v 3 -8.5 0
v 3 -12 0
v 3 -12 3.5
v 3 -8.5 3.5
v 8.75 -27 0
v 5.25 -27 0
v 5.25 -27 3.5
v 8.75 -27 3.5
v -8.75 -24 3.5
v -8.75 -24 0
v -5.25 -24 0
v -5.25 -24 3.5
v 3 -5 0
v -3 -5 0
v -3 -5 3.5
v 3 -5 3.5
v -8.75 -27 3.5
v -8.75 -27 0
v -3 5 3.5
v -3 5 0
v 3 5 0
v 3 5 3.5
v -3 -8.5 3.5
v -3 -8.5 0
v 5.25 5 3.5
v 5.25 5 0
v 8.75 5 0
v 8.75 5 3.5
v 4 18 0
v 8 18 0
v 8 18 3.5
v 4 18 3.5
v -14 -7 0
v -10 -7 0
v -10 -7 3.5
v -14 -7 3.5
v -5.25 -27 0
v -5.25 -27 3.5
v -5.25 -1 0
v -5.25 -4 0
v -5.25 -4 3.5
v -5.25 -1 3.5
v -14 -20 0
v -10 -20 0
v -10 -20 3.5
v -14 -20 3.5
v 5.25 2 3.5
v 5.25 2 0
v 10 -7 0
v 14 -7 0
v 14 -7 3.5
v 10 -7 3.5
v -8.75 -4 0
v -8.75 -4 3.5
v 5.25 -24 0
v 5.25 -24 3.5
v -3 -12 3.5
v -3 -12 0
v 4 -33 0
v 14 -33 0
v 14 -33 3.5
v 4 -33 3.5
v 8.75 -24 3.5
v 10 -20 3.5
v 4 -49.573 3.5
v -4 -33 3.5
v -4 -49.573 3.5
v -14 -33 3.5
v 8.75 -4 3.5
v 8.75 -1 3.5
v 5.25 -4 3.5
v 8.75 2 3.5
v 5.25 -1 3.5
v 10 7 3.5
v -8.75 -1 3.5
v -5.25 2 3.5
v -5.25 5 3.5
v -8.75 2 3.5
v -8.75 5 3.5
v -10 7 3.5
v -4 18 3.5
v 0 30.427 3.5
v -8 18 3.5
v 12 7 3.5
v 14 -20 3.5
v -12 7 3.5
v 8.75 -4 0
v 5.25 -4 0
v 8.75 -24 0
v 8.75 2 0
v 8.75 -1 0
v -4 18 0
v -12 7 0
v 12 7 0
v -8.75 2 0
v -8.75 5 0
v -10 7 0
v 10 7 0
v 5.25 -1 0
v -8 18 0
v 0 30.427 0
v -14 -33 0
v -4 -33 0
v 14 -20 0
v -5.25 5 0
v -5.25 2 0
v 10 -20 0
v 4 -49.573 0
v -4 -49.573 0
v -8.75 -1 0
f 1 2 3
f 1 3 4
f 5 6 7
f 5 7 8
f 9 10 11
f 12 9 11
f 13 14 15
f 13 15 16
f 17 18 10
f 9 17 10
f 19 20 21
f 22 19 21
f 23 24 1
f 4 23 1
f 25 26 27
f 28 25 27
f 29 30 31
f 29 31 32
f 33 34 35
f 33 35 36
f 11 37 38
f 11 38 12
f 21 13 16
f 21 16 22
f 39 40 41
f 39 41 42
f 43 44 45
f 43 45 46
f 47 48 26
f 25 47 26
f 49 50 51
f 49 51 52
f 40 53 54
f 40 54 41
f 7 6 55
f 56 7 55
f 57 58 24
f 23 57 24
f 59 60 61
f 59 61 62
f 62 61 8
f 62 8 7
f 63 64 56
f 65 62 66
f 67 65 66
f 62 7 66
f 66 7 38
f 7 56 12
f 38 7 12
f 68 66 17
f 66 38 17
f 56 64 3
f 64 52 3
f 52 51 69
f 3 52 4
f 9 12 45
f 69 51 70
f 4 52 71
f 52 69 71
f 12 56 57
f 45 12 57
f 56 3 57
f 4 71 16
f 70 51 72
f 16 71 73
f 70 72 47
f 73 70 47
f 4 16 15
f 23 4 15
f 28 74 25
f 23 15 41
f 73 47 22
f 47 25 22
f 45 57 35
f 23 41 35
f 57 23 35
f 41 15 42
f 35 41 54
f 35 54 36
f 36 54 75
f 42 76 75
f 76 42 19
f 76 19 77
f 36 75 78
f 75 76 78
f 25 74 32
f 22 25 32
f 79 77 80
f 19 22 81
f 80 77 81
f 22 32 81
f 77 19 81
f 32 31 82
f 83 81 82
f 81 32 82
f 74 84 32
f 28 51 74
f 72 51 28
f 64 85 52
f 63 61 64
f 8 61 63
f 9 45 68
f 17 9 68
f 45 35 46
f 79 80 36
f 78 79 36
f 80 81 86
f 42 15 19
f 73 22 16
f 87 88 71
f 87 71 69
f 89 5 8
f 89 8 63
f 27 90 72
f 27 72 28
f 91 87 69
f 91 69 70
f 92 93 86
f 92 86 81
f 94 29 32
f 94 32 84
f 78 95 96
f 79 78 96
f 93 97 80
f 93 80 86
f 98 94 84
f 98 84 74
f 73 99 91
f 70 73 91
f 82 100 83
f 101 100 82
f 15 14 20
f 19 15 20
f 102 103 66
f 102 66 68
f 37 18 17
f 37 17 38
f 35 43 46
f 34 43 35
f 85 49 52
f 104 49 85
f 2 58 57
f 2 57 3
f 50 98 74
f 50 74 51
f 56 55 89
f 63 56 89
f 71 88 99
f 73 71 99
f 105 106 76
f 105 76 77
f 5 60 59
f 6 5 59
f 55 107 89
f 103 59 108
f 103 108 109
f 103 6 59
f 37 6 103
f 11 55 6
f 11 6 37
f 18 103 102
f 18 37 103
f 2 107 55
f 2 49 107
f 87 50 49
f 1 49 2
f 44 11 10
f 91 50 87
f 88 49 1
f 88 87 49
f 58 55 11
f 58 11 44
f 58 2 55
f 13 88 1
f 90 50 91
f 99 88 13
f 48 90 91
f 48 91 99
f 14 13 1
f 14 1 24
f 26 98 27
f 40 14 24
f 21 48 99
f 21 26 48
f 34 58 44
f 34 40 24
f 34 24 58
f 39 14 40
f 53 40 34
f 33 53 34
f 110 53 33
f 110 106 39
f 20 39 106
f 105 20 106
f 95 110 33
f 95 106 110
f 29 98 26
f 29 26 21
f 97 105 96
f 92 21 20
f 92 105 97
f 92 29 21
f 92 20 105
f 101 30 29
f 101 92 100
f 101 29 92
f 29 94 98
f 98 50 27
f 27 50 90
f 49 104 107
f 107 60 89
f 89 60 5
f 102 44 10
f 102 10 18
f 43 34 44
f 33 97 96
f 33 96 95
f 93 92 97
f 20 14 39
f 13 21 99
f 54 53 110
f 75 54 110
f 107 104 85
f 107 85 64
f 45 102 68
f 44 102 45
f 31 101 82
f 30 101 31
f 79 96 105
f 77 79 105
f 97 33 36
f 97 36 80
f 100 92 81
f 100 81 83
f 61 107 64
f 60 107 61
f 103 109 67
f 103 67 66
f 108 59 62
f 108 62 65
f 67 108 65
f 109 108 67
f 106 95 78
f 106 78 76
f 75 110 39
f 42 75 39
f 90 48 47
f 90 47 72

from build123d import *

# Parameters (mm, degrees)
PROFILE_LASER_PROFILE_3P5_W   = 3.5
PROFILE_LASER_PROFILE_3P5_H   = 3
PROFILE_LASER_PROFILE_3P5_W_2 = 6
PROFILE_LASER_PROFILE_3P5_H_2 = 3.5
PROFILE_LASER_PROFILE_3P5_H_3 = 10
LASER_PROFILE_3P5_DEPTH       = 3.5


with BuildPart() as part:
    # Profile_Laser_profile_3p5 → Laser_profile_3p5 (new body)
    with BuildSketch(Plane.XY):
        Polygon((0, 30.427227289), (8, 18), (4, 18), (12, 7), (10, 7), (14, -7), (10, -7), (14, -20), (10, -20), (14, -33), (4, -33), (4, -49.572772711), (-4, -49.572772711), (-4, -33), (-14, -33), (-10, -20), (-14, -20), (-10, -7), (-14, -7), (-10, 7), (-12, 7), (-4, 18), (-8, 18), align=None)
        with Locations((-7, 3.5)):
            Rectangle(PROFILE_LASER_PROFILE_3P5_W, PROFILE_LASER_PROFILE_3P5_H, mode=Mode.SUBTRACT)
        with Locations((-7, -2.5)):
            Rectangle(PROFILE_LASER_PROFILE_3P5_W, PROFILE_LASER_PROFILE_3P5_H, mode=Mode.SUBTRACT)
        with Locations((-7, -25.5)):
            Rectangle(PROFILE_LASER_PROFILE_3P5_W, PROFILE_LASER_PROFILE_3P5_H, mode=Mode.SUBTRACT)
        with Locations((7, 3.5)):
            Rectangle(PROFILE_LASER_PROFILE_3P5_W, PROFILE_LASER_PROFILE_3P5_H, mode=Mode.SUBTRACT)
        with Locations((7, -2.5)):
            Rectangle(PROFILE_LASER_PROFILE_3P5_W, PROFILE_LASER_PROFILE_3P5_H, mode=Mode.SUBTRACT)
        with Locations((7, -25.5)):
            Rectangle(PROFILE_LASER_PROFILE_3P5_W, PROFILE_LASER_PROFILE_3P5_H, mode=Mode.SUBTRACT)
        with Locations((0, -10.25)):
            Rectangle(PROFILE_LASER_PROFILE_3P5_W_2, PROFILE_LASER_PROFILE_3P5_H_2, mode=Mode.SUBTRACT)
        Rectangle(PROFILE_LASER_PROFILE_3P5_W_2, PROFILE_LASER_PROFILE_3P5_H_3, mode=Mode.SUBTRACT)
    extrude(amount=LASER_PROFILE_3P5_DEPTH)


solid = part.part
